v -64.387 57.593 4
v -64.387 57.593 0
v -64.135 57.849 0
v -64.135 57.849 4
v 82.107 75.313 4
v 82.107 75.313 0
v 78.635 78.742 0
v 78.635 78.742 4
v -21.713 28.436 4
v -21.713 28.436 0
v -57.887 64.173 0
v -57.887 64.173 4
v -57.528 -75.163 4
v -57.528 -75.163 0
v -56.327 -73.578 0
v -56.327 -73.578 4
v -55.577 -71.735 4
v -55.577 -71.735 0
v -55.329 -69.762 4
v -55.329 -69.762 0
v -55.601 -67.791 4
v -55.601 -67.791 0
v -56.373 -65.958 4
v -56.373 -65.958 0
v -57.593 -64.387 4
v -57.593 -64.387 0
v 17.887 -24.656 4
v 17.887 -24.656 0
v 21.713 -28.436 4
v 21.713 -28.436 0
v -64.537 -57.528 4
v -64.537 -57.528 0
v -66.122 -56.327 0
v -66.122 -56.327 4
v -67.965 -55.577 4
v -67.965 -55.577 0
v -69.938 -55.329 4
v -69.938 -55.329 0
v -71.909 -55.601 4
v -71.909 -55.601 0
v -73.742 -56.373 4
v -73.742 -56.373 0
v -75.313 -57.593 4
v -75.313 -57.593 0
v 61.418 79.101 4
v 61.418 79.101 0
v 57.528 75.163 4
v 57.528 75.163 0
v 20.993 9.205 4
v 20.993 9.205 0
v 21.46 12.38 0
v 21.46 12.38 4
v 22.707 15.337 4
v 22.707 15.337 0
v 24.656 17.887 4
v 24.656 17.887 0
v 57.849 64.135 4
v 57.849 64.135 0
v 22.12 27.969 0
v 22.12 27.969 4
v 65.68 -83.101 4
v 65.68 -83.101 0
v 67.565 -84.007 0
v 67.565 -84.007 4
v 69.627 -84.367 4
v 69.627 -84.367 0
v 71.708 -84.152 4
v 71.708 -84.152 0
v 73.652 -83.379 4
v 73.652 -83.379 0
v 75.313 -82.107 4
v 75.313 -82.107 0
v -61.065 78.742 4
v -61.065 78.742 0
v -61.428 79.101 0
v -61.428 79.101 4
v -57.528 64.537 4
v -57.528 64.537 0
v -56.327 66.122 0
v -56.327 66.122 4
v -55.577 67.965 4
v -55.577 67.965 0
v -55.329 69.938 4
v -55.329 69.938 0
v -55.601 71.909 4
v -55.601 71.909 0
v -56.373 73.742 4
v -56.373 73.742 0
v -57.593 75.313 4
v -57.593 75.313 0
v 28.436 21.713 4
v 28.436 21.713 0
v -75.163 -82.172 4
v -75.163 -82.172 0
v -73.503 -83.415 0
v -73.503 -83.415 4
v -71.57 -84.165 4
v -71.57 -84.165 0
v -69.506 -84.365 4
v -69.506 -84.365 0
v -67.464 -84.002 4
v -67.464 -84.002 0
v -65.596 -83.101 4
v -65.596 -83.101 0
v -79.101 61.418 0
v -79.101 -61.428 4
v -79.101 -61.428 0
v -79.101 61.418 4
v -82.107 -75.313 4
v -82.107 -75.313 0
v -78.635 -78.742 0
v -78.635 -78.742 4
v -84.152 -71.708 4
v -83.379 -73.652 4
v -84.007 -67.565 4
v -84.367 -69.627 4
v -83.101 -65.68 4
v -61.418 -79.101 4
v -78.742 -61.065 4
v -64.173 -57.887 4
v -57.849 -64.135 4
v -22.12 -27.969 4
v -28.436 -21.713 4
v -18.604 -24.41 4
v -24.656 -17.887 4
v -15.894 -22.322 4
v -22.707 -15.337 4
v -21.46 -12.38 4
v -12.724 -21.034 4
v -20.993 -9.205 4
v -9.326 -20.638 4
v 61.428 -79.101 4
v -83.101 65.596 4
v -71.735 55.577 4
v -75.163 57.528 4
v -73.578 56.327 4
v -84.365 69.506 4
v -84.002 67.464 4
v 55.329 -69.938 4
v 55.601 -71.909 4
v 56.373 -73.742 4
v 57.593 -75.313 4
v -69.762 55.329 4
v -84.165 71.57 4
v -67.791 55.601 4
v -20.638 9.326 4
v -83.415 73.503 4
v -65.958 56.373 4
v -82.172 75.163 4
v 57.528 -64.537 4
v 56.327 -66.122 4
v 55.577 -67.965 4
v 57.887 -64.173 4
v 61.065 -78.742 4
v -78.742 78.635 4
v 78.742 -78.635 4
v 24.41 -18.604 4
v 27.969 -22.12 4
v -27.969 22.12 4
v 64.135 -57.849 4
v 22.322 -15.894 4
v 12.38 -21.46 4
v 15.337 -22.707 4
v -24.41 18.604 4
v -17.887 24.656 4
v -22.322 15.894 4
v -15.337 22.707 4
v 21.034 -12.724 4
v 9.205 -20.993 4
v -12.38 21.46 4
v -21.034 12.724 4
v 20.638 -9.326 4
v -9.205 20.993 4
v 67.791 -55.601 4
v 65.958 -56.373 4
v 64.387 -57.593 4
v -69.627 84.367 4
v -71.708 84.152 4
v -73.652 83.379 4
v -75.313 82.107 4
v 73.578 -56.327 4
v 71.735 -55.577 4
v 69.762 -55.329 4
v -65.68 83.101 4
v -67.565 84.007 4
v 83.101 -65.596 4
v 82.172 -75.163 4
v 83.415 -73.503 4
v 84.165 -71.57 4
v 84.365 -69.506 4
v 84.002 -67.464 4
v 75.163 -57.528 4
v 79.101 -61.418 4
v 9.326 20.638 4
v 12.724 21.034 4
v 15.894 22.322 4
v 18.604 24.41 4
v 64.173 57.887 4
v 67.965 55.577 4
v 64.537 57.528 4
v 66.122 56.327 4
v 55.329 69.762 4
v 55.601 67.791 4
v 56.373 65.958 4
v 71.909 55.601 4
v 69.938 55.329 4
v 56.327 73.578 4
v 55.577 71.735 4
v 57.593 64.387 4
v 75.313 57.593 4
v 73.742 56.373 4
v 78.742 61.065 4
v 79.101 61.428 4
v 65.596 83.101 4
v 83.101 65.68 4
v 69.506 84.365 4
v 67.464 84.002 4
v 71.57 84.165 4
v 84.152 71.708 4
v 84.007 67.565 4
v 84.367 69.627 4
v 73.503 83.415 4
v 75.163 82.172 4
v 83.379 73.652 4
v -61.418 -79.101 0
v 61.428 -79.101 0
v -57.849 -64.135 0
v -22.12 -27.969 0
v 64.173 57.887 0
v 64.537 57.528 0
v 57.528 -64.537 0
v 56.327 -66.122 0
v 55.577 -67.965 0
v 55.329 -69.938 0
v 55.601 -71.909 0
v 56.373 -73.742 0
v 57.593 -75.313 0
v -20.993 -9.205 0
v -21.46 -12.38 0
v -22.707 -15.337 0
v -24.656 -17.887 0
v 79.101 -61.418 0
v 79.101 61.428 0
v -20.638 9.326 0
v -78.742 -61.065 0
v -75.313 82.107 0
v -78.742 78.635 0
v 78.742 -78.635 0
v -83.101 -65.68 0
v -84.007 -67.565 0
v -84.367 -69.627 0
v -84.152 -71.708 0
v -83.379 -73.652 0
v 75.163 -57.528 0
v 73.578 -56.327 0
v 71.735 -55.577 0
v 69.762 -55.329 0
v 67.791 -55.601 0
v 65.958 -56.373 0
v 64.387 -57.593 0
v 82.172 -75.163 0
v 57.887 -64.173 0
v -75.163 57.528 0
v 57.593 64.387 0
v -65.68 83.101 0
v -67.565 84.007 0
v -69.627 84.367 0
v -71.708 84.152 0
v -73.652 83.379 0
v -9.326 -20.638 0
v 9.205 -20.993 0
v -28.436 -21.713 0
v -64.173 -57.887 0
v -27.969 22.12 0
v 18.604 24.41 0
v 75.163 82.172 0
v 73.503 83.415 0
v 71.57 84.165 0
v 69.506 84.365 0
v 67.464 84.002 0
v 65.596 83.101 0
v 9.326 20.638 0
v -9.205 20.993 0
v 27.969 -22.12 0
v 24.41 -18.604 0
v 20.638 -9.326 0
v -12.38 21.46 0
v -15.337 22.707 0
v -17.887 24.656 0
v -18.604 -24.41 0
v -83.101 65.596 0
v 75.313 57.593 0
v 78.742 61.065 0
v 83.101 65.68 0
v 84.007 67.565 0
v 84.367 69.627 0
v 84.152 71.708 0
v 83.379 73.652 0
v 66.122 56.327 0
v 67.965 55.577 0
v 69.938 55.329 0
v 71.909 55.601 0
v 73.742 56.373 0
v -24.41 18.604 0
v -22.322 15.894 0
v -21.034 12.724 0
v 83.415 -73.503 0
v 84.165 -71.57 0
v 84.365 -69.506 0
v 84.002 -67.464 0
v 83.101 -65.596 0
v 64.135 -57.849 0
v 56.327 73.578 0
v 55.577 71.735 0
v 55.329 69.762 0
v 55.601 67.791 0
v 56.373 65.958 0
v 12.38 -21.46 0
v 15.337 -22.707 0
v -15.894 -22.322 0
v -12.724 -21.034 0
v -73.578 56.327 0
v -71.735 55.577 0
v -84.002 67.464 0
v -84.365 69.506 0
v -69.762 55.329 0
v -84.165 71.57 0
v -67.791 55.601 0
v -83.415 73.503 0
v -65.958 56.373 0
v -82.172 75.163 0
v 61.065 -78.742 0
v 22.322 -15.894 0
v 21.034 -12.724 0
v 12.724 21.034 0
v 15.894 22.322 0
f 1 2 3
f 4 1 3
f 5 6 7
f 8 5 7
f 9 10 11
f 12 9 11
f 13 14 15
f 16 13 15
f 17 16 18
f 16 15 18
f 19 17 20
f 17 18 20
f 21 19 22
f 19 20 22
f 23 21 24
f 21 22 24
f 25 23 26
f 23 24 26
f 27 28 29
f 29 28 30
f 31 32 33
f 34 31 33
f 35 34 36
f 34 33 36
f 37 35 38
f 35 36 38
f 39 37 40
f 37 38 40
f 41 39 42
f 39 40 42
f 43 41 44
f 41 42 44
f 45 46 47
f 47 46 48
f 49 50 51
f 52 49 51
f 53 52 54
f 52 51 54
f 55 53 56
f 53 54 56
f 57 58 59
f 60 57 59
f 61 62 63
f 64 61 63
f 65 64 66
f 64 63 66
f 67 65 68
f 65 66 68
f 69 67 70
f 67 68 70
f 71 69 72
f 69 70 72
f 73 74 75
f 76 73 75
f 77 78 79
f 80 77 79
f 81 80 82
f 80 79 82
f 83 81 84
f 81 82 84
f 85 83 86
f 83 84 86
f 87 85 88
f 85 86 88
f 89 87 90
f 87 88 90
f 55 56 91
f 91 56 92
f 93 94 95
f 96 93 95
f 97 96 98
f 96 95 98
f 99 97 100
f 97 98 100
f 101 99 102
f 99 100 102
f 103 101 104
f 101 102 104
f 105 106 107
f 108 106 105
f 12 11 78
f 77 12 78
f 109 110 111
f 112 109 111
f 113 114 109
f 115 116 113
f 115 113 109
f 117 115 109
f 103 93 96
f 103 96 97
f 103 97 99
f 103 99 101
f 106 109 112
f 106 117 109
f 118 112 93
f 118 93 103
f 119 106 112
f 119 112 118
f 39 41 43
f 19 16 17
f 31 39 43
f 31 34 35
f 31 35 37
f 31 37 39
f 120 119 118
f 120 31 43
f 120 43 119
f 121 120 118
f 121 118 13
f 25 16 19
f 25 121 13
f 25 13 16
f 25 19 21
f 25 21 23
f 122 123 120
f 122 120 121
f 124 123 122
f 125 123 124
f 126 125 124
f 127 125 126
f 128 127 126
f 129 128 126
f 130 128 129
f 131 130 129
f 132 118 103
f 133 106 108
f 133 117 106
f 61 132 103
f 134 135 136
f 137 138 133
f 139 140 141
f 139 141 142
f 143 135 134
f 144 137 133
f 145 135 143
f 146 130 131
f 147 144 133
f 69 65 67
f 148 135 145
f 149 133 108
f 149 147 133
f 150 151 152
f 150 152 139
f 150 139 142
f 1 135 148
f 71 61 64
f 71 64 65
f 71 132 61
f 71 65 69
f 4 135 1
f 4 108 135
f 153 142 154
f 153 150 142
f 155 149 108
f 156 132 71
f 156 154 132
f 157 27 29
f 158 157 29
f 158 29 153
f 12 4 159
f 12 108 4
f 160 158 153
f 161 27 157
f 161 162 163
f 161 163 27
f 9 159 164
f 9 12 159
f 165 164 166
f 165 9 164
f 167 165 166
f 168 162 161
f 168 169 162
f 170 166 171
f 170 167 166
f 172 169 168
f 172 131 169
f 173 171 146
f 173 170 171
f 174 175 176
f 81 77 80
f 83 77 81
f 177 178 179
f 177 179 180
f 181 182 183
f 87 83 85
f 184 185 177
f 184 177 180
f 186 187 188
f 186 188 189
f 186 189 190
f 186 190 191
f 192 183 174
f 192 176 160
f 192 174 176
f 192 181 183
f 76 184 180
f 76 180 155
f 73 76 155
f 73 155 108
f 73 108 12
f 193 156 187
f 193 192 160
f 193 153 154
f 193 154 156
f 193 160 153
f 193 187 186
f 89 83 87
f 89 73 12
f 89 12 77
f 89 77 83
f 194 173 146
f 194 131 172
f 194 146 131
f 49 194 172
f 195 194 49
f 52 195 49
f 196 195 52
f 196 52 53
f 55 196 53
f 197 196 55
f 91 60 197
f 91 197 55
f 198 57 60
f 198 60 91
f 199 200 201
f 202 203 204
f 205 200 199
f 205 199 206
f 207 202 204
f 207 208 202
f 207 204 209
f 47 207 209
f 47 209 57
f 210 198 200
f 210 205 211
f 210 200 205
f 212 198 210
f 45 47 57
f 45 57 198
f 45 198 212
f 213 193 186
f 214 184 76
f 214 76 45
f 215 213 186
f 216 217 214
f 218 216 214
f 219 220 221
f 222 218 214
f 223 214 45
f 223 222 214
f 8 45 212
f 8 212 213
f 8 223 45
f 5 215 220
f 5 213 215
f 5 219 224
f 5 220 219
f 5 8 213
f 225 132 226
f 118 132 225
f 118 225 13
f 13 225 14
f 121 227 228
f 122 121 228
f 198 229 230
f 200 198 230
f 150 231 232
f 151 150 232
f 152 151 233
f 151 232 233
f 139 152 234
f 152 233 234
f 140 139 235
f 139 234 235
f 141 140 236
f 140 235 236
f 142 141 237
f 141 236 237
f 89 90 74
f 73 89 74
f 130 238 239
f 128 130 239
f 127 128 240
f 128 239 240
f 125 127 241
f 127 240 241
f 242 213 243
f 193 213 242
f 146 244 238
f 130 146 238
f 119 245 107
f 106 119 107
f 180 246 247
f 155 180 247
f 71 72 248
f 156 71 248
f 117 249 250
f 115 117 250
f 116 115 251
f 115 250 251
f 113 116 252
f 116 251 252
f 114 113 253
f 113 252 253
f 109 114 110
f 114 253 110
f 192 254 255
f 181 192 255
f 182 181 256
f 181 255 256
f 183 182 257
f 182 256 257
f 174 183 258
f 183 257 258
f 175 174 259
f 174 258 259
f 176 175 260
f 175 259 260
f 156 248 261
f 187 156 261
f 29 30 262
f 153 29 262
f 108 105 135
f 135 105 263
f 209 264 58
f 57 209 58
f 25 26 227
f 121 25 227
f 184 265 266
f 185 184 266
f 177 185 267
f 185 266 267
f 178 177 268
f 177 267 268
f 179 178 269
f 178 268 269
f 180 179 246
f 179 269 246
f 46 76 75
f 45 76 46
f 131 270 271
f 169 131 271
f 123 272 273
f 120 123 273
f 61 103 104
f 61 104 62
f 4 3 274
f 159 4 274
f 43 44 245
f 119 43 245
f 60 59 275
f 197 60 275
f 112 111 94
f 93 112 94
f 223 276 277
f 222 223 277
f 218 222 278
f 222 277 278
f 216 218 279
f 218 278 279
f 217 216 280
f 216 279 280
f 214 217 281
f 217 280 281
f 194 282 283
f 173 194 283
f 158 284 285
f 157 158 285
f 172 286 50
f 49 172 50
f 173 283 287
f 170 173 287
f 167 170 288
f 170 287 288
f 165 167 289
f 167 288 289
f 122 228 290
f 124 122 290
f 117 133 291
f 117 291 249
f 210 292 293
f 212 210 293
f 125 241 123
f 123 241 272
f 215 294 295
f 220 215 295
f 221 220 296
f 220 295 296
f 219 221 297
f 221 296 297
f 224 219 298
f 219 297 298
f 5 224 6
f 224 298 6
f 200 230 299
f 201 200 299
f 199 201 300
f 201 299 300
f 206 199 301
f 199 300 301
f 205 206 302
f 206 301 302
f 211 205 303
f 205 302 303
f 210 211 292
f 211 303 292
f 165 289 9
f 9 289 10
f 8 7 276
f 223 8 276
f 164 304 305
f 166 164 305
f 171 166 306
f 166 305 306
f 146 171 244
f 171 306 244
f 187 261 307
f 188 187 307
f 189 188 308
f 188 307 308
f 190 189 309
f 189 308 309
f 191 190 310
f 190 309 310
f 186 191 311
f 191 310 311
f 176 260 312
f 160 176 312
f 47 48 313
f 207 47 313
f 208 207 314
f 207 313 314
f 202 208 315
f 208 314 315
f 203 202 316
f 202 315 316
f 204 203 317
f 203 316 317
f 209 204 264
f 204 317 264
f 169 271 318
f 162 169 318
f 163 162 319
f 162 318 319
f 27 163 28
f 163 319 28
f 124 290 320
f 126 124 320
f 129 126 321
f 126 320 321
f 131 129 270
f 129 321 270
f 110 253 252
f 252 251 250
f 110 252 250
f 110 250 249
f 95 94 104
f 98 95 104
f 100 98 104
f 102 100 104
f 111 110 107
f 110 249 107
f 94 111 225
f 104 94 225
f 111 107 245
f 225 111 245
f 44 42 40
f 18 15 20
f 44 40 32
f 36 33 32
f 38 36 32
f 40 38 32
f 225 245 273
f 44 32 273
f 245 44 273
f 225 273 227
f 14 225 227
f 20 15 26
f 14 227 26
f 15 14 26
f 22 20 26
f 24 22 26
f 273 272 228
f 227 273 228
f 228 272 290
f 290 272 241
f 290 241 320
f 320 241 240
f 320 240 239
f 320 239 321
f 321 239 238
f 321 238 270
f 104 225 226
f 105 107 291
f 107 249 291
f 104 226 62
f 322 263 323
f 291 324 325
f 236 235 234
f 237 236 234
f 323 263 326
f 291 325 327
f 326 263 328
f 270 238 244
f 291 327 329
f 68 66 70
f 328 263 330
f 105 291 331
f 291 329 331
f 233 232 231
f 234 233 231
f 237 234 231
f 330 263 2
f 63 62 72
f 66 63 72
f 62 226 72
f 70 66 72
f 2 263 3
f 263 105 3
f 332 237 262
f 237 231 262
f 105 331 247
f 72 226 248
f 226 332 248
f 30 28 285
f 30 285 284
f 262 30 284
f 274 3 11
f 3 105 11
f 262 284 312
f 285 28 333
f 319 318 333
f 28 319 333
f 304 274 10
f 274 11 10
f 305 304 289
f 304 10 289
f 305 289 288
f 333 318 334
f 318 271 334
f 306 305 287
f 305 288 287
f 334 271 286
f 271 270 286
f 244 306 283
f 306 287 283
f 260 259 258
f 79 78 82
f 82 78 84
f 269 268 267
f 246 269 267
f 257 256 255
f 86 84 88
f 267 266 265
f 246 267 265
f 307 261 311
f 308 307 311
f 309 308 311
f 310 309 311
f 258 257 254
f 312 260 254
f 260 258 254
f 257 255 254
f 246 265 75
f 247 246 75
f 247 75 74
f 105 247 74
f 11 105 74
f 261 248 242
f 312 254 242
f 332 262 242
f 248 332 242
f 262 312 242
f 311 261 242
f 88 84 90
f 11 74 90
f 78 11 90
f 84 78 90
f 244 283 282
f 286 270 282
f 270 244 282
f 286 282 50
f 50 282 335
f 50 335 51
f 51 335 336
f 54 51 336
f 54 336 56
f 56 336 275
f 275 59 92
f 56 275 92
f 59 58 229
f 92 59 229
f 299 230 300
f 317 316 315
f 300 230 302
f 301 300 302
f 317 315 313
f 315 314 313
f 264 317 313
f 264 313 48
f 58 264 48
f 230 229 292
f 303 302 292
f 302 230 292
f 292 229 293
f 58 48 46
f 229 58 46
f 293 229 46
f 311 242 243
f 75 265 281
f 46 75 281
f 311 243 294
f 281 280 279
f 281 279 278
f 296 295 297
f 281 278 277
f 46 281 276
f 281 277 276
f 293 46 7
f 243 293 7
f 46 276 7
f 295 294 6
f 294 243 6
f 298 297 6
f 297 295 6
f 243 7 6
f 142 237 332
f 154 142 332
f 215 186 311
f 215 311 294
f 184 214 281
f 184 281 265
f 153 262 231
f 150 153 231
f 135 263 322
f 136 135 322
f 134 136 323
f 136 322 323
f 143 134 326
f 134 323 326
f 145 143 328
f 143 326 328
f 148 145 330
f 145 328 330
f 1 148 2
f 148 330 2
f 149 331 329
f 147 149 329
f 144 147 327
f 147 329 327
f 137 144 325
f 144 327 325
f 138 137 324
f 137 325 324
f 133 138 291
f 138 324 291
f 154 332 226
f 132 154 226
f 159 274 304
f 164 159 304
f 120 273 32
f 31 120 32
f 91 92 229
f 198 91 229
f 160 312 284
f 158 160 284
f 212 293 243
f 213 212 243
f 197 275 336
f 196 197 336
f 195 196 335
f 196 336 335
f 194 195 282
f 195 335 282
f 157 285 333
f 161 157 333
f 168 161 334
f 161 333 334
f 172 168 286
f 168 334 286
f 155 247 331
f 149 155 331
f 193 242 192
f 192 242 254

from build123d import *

# Parameters (mm, degrees)
F1_DEPTH = 4
F3_DEPTH = 4


with BuildPart() as f1:
    # F0 (on Top) → F1 (new body)
    with BuildSketch(Plane.XY):
        with BuildLine():
            Line((-64.135030253, 57.8487346722), (-60.9918824626, 60.9918824626))
            Line((-60.9918824626, 60.9918824626), (-57.8872043507, 64.1730347516))
            Line((-57.8872043507, 64.1730347516), (-57.5279368508, 64.536699731))
            ThreePointArc((-57.5279368508, 64.536699731), (-55.3289064598, 69.9383294266), (-57.5934861455, 75.3128077153))
            Line((-57.5934861455, 75.3128077153), (-61.0650929383, 78.7424354322))
            Line((-61.0650929383, 78.7424354322), (-64.536699731, 82.1720631491))
            ThreePointArc((-64.536699731, 82.1720631491), (-69.9383294266, 84.3710935402), (-75.3128077153, 82.1065138545))
            Line((-75.3128077153, 82.1065138545), (-78.7424354322, 78.6349070617))
            Line((-78.7424354322, 78.6349070617), (-82.1720631491, 75.163300269))
            ThreePointArc((-82.1720631491, 75.163300269), (-84.3710935402, 69.7616705734), (-82.1065138545, 64.3871922846))
            Line((-82.1065138545, 64.3871922846), (-75.163300269, 57.5279368508))
            ThreePointArc((-75.163300269, 57.5279368508), (-69.7616705734, 55.3289064598), (-64.3871922846, 57.5934861455))
            Line((-64.3871922846, 57.5934861455), (-64.135030253, 57.8487346722))
        make_face()
        with BuildLine():
            Line((-60.9918824626, 60.9918824626), (-24.9487193947, 24.9487193947))
            ThreePointArc((-24.9487193947, 24.9487193947), (-23.2982405477, 26.6622275187), (-21.7131078047, 28.4363596169))
            Line((-21.7131078047, 28.4363596169), (-57.8872043507, 64.1730347516))
            Line((-57.8872043507, 64.1730347516), (-60.9918824626, 60.9918824626))
        make_face()
        with BuildLine():
            ThreePointArc((-27.9685415263, 22.1195753621), (-26.4355788417, 23.5095421312), (-24.9487193947, 24.9487193947))
            Line((-24.9487193947, 24.9487193947), (-60.9918824626, 60.9918824626))
            Line((-60.9918824626, 60.9918824626), (-64.135030253, 57.8487346722))
            Line((-64.135030253, 57.8487346722), (-27.9685415263, 22.1195753621))
        make_face()
        with BuildLine():
            Line((-24.9487193947, 24.9487193947), (0, 0))
            Line((0, 0), (24.9487193947, 24.9487193947))
            ThreePointArc((24.9487193947, 24.9487193947), (23.5095421312, 26.4355788417), (22.1195753621, 27.9685415263))
            Line((22.1195753621, 27.9685415263), (18.6042693789, 24.4102077544))
            ThreePointArc((18.6042693789, 24.4102077544), (14.3526979396, 21.5708297932), (9.3259920152, 20.6380090919))
            Line((9.3259920152, 20.6380090919), (-9.2049935755, 20.9934651587))
            ThreePointArc((-9.2049935755, 20.9934651587), (-13.8982384325, 21.9899359298), (-17.8868961856, 24.6564149968))
            Line((-17.8868961856, 24.6564149968), (-21.7131078047, 28.4363596169))
            ThreePointArc((-21.7131078047, 28.4363596169), (-23.2982405477, 26.6622275187), (-24.9487193947, 24.9487193947))
        make_face()
        with BuildLine():
            Line((-24.6564149968, -17.8868961856), (-28.4363596169, -21.7131078047))
            ThreePointArc((-28.4363596169, -21.7131078047), (-26.6622275187, -23.2982405478), (-24.9487193947, -24.9487193947))
            Line((-24.9487193947, -24.9487193947), (0, 0))
            Line((0, 0), (-24.9487193947, 24.9487193947))
            ThreePointArc((-24.9487193947, 24.9487193947), (-26.4355788417, 23.5095421312), (-27.9685415263, 22.1195753621))
            Line((-27.9685415263, 22.1195753621), (-24.4102077544, 18.6042693789))
            ThreePointArc((-24.4102077544, 18.6042693789), (-21.5708297932, 14.3526979396), (-20.6380090919, 9.3259920152))
            Line((-20.6380090919, 9.3259920152), (-20.9934651587, -9.2049935755))
            ThreePointArc((-20.9934651587, -9.2049935755), (-21.9899359298, -13.8982384325), (-24.6564149968, -17.8868961856))
        make_face()
        with BuildLine():
            ThreePointArc((-24.9487193947, -24.9487193947), (-23.5095421312, -26.4355788418), (-22.1195753621, -27.9685415263))
            Line((-22.1195753621, -27.9685415263), (-18.6042693789, -24.4102077545))
            ThreePointArc((-18.6042693789, -24.4102077545), (-14.3526979396, -21.5708297932), (-9.3259920152, -20.6380090919))
            Line((-9.3259920152, -20.6380090919), (9.2049935755, -20.9934651587))
            ThreePointArc((9.2049935755, -20.9934651587), (13.8982384325, -21.9899359298), (17.8868961856, -24.6564149968))
            Line((17.8868961856, -24.6564149968), (21.7131078047, -28.4363596169))
            ThreePointArc((21.7131078047, -28.4363596169), (23.2982405477, -26.6622275187), (24.9487193947, -24.9487193947))
            Line((24.9487193947, -24.9487193947), (0, 0))
            Line((0, 0), (-24.9487193947, -24.9487193947))
        make_face()
        with BuildLine():
            Line((24.9487193947, 24.9487193947), (0, 0))
            Line((0, 0), (24.9487193947, -24.9487193947))
            ThreePointArc((24.9487193947, -24.9487193947), (26.4355788417, -23.5095421312), (27.9685415263, -22.1195753621))
            Line((27.9685415263, -22.1195753621), (24.4102077545, -18.6042693789))
            ThreePointArc((24.4102077545, -18.6042693789), (21.5708297932, -14.3526979396), (20.6380090919, -9.3259920152))
            Line((20.6380090919, -9.3259920152), (20.9934651587, 9.2049935755))
            ThreePointArc((20.9934651587, 9.2049935755), (21.9899359298, 13.8982384325), (24.6564149968, 17.8868961856))
            Line((24.6564149968, 17.8868961856), (28.4363596169, 21.7131078047))
            ThreePointArc((28.4363596169, 21.7131078047), (26.6622275187, 23.2982405477), (24.9487193947, 24.9487193947))
        make_face()
        with BuildLine():
            Line((60.9918824626, 60.9918824626), (24.9487193947, 24.9487193947))
            ThreePointArc((24.9487193947, 24.9487193947), (26.6622275187, 23.2982405477), (28.4363596169, 21.7131078047))
            Line((28.4363596169, 21.7131078047), (64.1730347516, 57.8872043507))
            Line((64.1730347516, 57.8872043507), (60.9918824626, 60.9918824626))
        make_face()
        with BuildLine():
            ThreePointArc((22.1195753621, 27.9685415263), (23.5095421312, 26.4355788417), (24.9487193947, 24.9487193947))
            Line((24.9487193947, 24.9487193947), (60.9918824626, 60.9918824626))
            Line((60.9918824626, 60.9918824626), (57.8487346722, 64.135030253))
            Line((57.8487346722, 64.135030253), (22.1195753621, 27.9685415263))
        make_face()
        with BuildLine():
            Line((57.8487346722, 64.135030253), (60.9918824626, 60.9918824626))
            Line((60.9918824626, 60.9918824626), (64.1730347516, 57.8872043507))
            Line((64.1730347516, 57.8872043507), (64.536699731, 57.5279368508))
            ThreePointArc((64.536699731, 57.5279368508), (69.9383294266, 55.3289064598), (75.3128077154, 57.5934861455))
            Line((75.3128077154, 57.5934861455), (78.7424354323, 61.0650929383))
            Line((78.7424354323, 61.0650929383), (82.1720631492, 64.536699731))
            ThreePointArc((82.1720631492, 64.536699731), (84.3710935402, 69.9383294266), (82.1065138545, 75.3128077153))
            Line((82.1065138545, 75.3128077153), (78.6349070617, 78.7424354322))
            Line((78.6349070617, 78.7424354322), (75.163300269, 82.1720631491))
            ThreePointArc((75.163300269, 82.1720631491), (69.7616705734, 84.3710935402), (64.3871922846, 82.1065138545))
            Line((64.3871922846, 82.1065138545), (57.5279368508, 75.163300269))
            ThreePointArc((57.5279368508, 75.163300269), (55.3289064598, 69.7616705734), (57.5934861455, 64.3871922846))
            Line((57.5934861455, 64.3871922846), (57.8487346722, 64.135030253))
        make_face()
        with BuildLine():
            Line((64.135030253, -57.8487346722), (60.9918824626, -60.9918824626))
            Line((60.9918824626, -60.9918824626), (57.8872043507, -64.1730347516))
            Line((57.8872043507, -64.1730347516), (57.5279368509, -64.536699731))
            ThreePointArc((57.5279368509, -64.536699731), (55.3289064598, -69.9383294266), (57.5934861455, -75.3128077154))
            Line((57.5934861455, -75.3128077154), (61.0650929383, -78.7424354323))
            Line((61.0650929383, -78.7424354323), (64.536699731, -82.1720631492))
            ThreePointArc((64.536699731, -82.1720631492), (69.9383294266, -84.3710935402), (75.3128077154, -82.1065138545))
            Line((75.3128077154, -82.1065138545), (78.7424354323, -78.6349070617))
            Line((78.7424354323, -78.6349070617), (82.1720631492, -75.163300269))
            ThreePointArc((82.1720631492, -75.163300269), (84.3710935402, -69.7616705734), (82.1065138545, -64.3871922846))
            Line((82.1065138545, -64.3871922846), (75.163300269, -57.5279368508))
            ThreePointArc((75.163300269, -57.5279368508), (69.7616705734, -55.3289064598), (64.3871922847, -57.5934861455))
            Line((64.3871922847, -57.5934861455), (64.135030253, -57.8487346722))
        make_face()
        with BuildLine():
            ThreePointArc((27.9685415263, -22.1195753621), (26.4355788417, -23.5095421312), (24.9487193947, -24.9487193947))
            Line((24.9487193947, -24.9487193947), (60.9918824626, -60.9918824626))
            Line((60.9918824626, -60.9918824626), (64.135030253, -57.8487346722))
            Line((64.135030253, -57.8487346722), (27.9685415263, -22.1195753621))
        make_face()
        with BuildLine():
            Line((60.9918824626, -60.9918824626), (24.9487193947, -24.9487193947))
            ThreePointArc((24.9487193947, -24.9487193947), (23.2982405477, -26.6622275187), (21.7131078047, -28.4363596169))
            Line((21.7131078047, -28.4363596169), (57.8872043507, -64.1730347516))
            Line((57.8872043507, -64.1730347516), (60.9918824626, -60.9918824626))
        make_face()
        with BuildLine():
            Line((-57.8487346722, -64.135030253), (-22.1195753621, -27.9685415263))
            ThreePointArc((-22.1195753621, -27.9685415263), (-23.5095421312, -26.4355788418), (-24.9487193947, -24.9487193947))
            Line((-24.9487193947, -24.9487193947), (-60.9918824626, -60.9918824626))
            Line((-60.9918824626, -60.9918824626), (-57.8487346722, -64.135030253))
        make_face()
        with BuildLine():
            ThreePointArc((-24.9487193947, -24.9487193947), (-26.6622275187, -23.2982405478), (-28.4363596169, -21.7131078047))
            Line((-28.4363596169, -21.7131078047), (-64.1730347516, -57.8872043507))
            Line((-64.1730347516, -57.8872043507), (-60.9918824626, -60.9918824626))
            Line((-60.9918824626, -60.9918824626), (-24.9487193947, -24.9487193947))
        make_face()
        with BuildLine():
            Line((-57.5934861455, -64.3871922847), (-57.8487346722, -64.135030253))
            Line((-57.8487346722, -64.135030253), (-60.9918824626, -60.9918824626))
            Line((-60.9918824626, -60.9918824626), (-64.1730347516, -57.8872043507))
            Line((-64.1730347516, -57.8872043507), (-64.536699731, -57.5279368509))
            ThreePointArc((-64.536699731, -57.5279368509), (-69.9383294266, -55.3289064598), (-75.3128077153, -57.5934861455))
            Line((-75.3128077153, -57.5934861455), (-78.7424354322, -61.0650929383))
            Line((-78.7424354322, -61.0650929383), (-82.1720631491, -64.536699731))
            ThreePointArc((-82.1720631491, -64.536699731), (-84.3710935402, -69.9383294266), (-82.1065138545, -75.3128077154))
            Line((-82.1065138545, -75.3128077154), (-78.6349070617, -78.7424354323))
            Line((-78.6349070617, -78.7424354323), (-75.163300269, -82.1720631492))
            ThreePointArc((-75.163300269, -82.1720631492), (-69.7616705734, -84.3710935402), (-64.3871922846, -82.1065138545))
            Line((-64.3871922846, -82.1065138545), (-57.5279368508, -75.163300269))
            ThreePointArc((-57.5279368508, -75.163300269), (-55.3289064598, -69.7616705734), (-57.5934861455, -64.3871922847))
        make_face()
    extrude(amount=F1_DEPTH)

    # F2 (on face) → F3 (join)
    with BuildSketch(Plane.XY.offset(4)):
        with BuildLine():
            ThreePointArc((-64.3871922846, -82.1065138545), (-64.9658566006, -82.634927624), (-65.5957303462, -83.1011170351))
            Line((-65.5957303462, -83.1011170351), (65.6796884979, -83.1011170351))
            ThreePointArc((65.6796884979, -83.1011170351), (65.0856932086, -82.6642723213), (64.536699731, -82.1720631492))
            Line((64.536699731, -82.1720631492), (61.4281648492, -79.1011170351))
            Line((61.4281648492, -79.1011170351), (-61.4181370755, -79.1011170351))
            Line((-61.4181370755, -79.1011170351), (-64.3871922846, -82.1065138545))
        make_face()
        with BuildLine():
            ThreePointArc((-75.163300269, -82.1720631492), (-70.5444929949, -84.335561038), (-65.5957303462, -83.1011170351))
            ThreePointArc((-65.5957303462, -83.1011170351), (-64.9658566006, -82.634927624), (-64.3871922846, -82.1065138545))
            Line((-64.3871922846, -82.1065138545), (-61.4181370755, -79.1011170351))
            Line((-61.4181370755, -79.1011170351), (-57.5279368508, -75.163300269))
            ThreePointArc((-57.5279368508, -75.163300269), (-55.3289064598, -69.7616705734), (-57.5934861455, -64.3871922847))
            Line((-57.5934861455, -64.3871922847), (-57.8487346722, -64.135030253))
            Line((-57.8487346722, -64.135030253), (-18.6042693789, -24.4102077545))
            ThreePointArc((-18.6042693789, -24.4102077545), (-14.3526979396, -21.5708297932), (-9.3259920152, -20.6380090919))
            Line((-9.3259920152, -20.6380090919), (9.2049935755, -20.9934651587))
            ThreePointArc((9.2049935755, -20.9934651587), (13.8982384325, -21.9899359298), (17.8868961856, -24.6564149968))
            Line((17.8868961856, -24.6564149968), (57.8872043507, -64.1730347516))
            Line((57.8872043507, -64.1730347516), (57.5279368509, -64.536699731))
            ThreePointArc((57.5279368509, -64.536699731), (55.3289064598, -69.9383294266), (57.5934861455, -75.3128077154))
            Line((57.5934861455, -75.3128077154), (61.4281648492, -79.1011170351))
            Line((61.4281648492, -79.1011170351), (64.536699731, -82.1720631492))
            ThreePointArc((64.536699731, -82.1720631492), (65.0856932086, -82.6642723213), (65.6796884979, -83.1011170351))
            ThreePointArc((65.6796884979, -83.1011170351), (70.6745708809, -84.3309409727), (75.3128077154, -82.1065138545))
            Line((75.3128077154, -82.1065138545), (82.1720631492, -75.163300269))
            ThreePointArc((82.1720631492, -75.163300269), (84.335561038, -70.5444929949), (83.1011170351, -65.5957303462))
            ThreePointArc((83.1011170351, -65.5957303462), (82.634927624, -64.9658566006), (82.1065138545, -64.3871922846))
            Line((82.1065138545, -64.3871922846), (79.1011170351, -61.4181370755))
            Line((79.1011170351, -61.4181370755), (75.163300269, -57.5279368508))
            ThreePointArc((75.163300269, -57.5279368508), (69.7616705734, -55.3289064598), (64.3871922847, -57.5934861455))
            Line((64.3871922847, -57.5934861455), (64.135030253, -57.8487346722))
            Line((64.135030253, -57.8487346722), (24.4102077545, -18.6042693789))
            ThreePointArc((24.4102077545, -18.6042693789), (21.5708297932, -14.3526979396), (20.6380090919, -9.3259920152))
            Line((20.6380090919, -9.3259920152), (20.9934651587, 9.2049935755))
            ThreePointArc((20.9934651587, 9.2049935755), (21.9899359298, 13.8982384325), (24.6564149968, 17.8868961856))
            Line((24.6564149968, 17.8868961856), (64.1730347516, 57.8872043507))
            Line((64.1730347516, 57.8872043507), (64.536699731, 57.5279368508))
            ThreePointArc((64.536699731, 57.5279368508), (69.9383294266, 55.3289064598), (75.3128077154, 57.5934861455))
            Line((75.3128077154, 57.5934861455), (79.1011170351, 61.4281648492))
            Line((79.1011170351, 61.4281648492), (82.1720631492, 64.536699731))
            ThreePointArc((82.1720631492, 64.536699731), (82.6642723213, 65.0856932086), (83.1011170351, 65.6796884979))
            ThreePointArc((83.1011170351, 65.6796884979), (84.3309409727, 70.6745708809), (82.1065138545, 75.3128077153))
            Line((82.1065138545, 75.3128077153), (75.163300269, 82.1720631491))
            ThreePointArc((75.163300269, 82.1720631491), (70.5444929949, 84.335561038), (65.5957303462, 83.1011170351))
            ThreePointArc((65.5957303462, 83.1011170351), (64.9658566006, 82.634927624), (64.3871922846, 82.1065138545))
            Line((64.3871922846, 82.1065138545), (61.4181370755, 79.1011170351))
            Line((61.4181370755, 79.1011170351), (57.5279368508, 75.163300269))
            ThreePointArc((57.5279368508, 75.163300269), (55.3289064598, 69.7616705734), (57.5934861455, 64.3871922846))
            Line((57.5934861455, 64.3871922846), (57.8487346722, 64.135030253))
            Line((57.8487346722, 64.135030253), (18.6042693789, 24.4102077544))
            ThreePointArc((18.6042693789, 24.4102077544), (14.3526979396, 21.5708297932), (9.3259920152, 20.6380090919))
            Line((9.3259920152, 20.6380090919), (-9.2049935755, 20.9934651587))
            ThreePointArc((-9.2049935755, 20.9934651587), (-13.8982384325, 21.9899359298), (-17.8868961856, 24.6564149968))
            Line((-17.8868961856, 24.6564149968), (-57.8872043507, 64.1730347516))
            Line((-57.8872043507, 64.1730347516), (-57.5279368508, 64.536699731))
            ThreePointArc((-57.5279368508, 64.536699731), (-55.3289064598, 69.9383294266), (-57.5934861455, 75.3128077153))
            Line((-57.5934861455, 75.3128077153), (-61.4281648492, 79.1011170351))
            Line((-61.4281648492, 79.1011170351), (-64.536699731, 82.1720631491))
            ThreePointArc((-64.536699731, 82.1720631491), (-65.0856932086, 82.6642723213), (-65.6796884979, 83.1011170351))
            ThreePointArc((-65.6796884979, 83.1011170351), (-70.6745708809, 84.3309409727), (-75.3128077153, 82.1065138545))
            Line((-75.3128077153, 82.1065138545), (-82.1720631491, 75.163300269))
            ThreePointArc((-82.1720631491, 75.163300269), (-84.335561038, 70.5444929949), (-83.1011170351, 65.5957303462))
            ThreePointArc((-83.1011170351, 65.5957303462), (-82.634927624, 64.9658566006), (-82.1065138545, 64.3871922846))
            Line((-82.1065138545, 64.3871922846), (-79.1011170351, 61.4181370755))
            Line((-79.1011170351, 61.4181370755), (-75.163300269, 57.5279368508))
            ThreePointArc((-75.163300269, 57.5279368508), (-69.7616705734, 55.3289064598), (-64.3871922846, 57.5934861455))
            Line((-64.3871922846, 57.5934861455), (-64.135030253, 57.8487346722))
            Line((-64.135030253, 57.8487346722), (-24.4102077544, 18.6042693789))
            ThreePointArc((-24.4102077544, 18.6042693789), (-21.5708297932, 14.3526979396), (-20.6380090919, 9.3259920152))
            Line((-20.6380090919, 9.3259920152), (-20.9934651587, -9.2049935755))
            ThreePointArc((-20.9934651587, -9.2049935755), (-21.9899359298, -13.8982384325), (-24.6564149968, -17.8868961856))
            Line((-24.6564149968, -17.8868961856), (-64.1730347516, -57.8872043507))
            Line((-64.1730347516, -57.8872043507), (-64.536699731, -57.5279368509))
            ThreePointArc((-64.536699731, -57.5279368509), (-69.9383294266, -55.3289064598), (-75.3128077153, -57.5934861455))
            Line((-75.3128077153, -57.5934861455), (-79.1011170351, -61.4281648492))
            Line((-79.1011170351, -61.4281648492), (-82.1720631491, -64.536699731))
            ThreePointArc((-82.1720631491, -64.536699731), (-82.6642723213, -65.0856932086), (-83.1011170351, -65.6796884979))
            ThreePointArc((-83.1011170351, -65.6796884979), (-84.3309409727, -70.6745708809), (-82.1065138545, -75.3128077154))
            Line((-82.1065138545, -75.3128077154), (-75.163300269, -82.1720631492))
        make_face()
        with BuildLine():
            Line((-83.1011170351, 65.5957303462), (-83.1011170351, -65.6796884979))
            ThreePointArc((-83.1011170351, -65.6796884979), (-82.6642723213, -65.0856932086), (-82.1720631491, -64.536699731))
            Line((-82.1720631491, -64.536699731), (-79.1011170351, -61.4281648492))
            Line((-79.1011170351, -61.4281648492), (-79.1011170351, 61.4181370755))
            Line((-79.1011170351, 61.4181370755), (-82.1065138545, 64.3871922846))
            ThreePointArc((-82.1065138545, 64.3871922846), (-82.634927624, 64.9658566006), (-83.1011170351, 65.5957303462))
        make_face()
        with BuildLine():
            ThreePointArc((82.1065138545, -64.3871922846), (82.634927624, -64.9658566006), (83.1011170351, -65.5957303462))
            Line((83.1011170351, -65.5957303462), (83.1011170351, 65.6796884979))
            ThreePointArc((83.1011170351, 65.6796884979), (82.6642723213, 65.0856932086), (82.1720631492, 64.536699731))
            Line((82.1720631492, 64.536699731), (79.1011170351, 61.4281648492))
            Line((79.1011170351, 61.4281648492), (79.1011170351, -61.4181370755))
            Line((79.1011170351, -61.4181370755), (82.1065138545, -64.3871922846))
        make_face()
        with BuildLine():
            Line((65.5957303462, 83.1011170351), (-65.6796884979, 83.1011170351))
            ThreePointArc((-65.6796884979, 83.1011170351), (-65.0856932086, 82.6642723213), (-64.536699731, 82.1720631491))
            Line((-64.536699731, 82.1720631491), (-61.4281648492, 79.1011170351))
            Line((-61.4281648492, 79.1011170351), (61.4181370755, 79.1011170351))
            Line((61.4181370755, 79.1011170351), (64.3871922846, 82.1065138545))
            ThreePointArc((64.3871922846, 82.1065138545), (64.9658566006, 82.634927624), (65.5957303462, 83.1011170351))
        make_face()
    extrude(amount=-F3_DEPTH)


solid = f1.part
